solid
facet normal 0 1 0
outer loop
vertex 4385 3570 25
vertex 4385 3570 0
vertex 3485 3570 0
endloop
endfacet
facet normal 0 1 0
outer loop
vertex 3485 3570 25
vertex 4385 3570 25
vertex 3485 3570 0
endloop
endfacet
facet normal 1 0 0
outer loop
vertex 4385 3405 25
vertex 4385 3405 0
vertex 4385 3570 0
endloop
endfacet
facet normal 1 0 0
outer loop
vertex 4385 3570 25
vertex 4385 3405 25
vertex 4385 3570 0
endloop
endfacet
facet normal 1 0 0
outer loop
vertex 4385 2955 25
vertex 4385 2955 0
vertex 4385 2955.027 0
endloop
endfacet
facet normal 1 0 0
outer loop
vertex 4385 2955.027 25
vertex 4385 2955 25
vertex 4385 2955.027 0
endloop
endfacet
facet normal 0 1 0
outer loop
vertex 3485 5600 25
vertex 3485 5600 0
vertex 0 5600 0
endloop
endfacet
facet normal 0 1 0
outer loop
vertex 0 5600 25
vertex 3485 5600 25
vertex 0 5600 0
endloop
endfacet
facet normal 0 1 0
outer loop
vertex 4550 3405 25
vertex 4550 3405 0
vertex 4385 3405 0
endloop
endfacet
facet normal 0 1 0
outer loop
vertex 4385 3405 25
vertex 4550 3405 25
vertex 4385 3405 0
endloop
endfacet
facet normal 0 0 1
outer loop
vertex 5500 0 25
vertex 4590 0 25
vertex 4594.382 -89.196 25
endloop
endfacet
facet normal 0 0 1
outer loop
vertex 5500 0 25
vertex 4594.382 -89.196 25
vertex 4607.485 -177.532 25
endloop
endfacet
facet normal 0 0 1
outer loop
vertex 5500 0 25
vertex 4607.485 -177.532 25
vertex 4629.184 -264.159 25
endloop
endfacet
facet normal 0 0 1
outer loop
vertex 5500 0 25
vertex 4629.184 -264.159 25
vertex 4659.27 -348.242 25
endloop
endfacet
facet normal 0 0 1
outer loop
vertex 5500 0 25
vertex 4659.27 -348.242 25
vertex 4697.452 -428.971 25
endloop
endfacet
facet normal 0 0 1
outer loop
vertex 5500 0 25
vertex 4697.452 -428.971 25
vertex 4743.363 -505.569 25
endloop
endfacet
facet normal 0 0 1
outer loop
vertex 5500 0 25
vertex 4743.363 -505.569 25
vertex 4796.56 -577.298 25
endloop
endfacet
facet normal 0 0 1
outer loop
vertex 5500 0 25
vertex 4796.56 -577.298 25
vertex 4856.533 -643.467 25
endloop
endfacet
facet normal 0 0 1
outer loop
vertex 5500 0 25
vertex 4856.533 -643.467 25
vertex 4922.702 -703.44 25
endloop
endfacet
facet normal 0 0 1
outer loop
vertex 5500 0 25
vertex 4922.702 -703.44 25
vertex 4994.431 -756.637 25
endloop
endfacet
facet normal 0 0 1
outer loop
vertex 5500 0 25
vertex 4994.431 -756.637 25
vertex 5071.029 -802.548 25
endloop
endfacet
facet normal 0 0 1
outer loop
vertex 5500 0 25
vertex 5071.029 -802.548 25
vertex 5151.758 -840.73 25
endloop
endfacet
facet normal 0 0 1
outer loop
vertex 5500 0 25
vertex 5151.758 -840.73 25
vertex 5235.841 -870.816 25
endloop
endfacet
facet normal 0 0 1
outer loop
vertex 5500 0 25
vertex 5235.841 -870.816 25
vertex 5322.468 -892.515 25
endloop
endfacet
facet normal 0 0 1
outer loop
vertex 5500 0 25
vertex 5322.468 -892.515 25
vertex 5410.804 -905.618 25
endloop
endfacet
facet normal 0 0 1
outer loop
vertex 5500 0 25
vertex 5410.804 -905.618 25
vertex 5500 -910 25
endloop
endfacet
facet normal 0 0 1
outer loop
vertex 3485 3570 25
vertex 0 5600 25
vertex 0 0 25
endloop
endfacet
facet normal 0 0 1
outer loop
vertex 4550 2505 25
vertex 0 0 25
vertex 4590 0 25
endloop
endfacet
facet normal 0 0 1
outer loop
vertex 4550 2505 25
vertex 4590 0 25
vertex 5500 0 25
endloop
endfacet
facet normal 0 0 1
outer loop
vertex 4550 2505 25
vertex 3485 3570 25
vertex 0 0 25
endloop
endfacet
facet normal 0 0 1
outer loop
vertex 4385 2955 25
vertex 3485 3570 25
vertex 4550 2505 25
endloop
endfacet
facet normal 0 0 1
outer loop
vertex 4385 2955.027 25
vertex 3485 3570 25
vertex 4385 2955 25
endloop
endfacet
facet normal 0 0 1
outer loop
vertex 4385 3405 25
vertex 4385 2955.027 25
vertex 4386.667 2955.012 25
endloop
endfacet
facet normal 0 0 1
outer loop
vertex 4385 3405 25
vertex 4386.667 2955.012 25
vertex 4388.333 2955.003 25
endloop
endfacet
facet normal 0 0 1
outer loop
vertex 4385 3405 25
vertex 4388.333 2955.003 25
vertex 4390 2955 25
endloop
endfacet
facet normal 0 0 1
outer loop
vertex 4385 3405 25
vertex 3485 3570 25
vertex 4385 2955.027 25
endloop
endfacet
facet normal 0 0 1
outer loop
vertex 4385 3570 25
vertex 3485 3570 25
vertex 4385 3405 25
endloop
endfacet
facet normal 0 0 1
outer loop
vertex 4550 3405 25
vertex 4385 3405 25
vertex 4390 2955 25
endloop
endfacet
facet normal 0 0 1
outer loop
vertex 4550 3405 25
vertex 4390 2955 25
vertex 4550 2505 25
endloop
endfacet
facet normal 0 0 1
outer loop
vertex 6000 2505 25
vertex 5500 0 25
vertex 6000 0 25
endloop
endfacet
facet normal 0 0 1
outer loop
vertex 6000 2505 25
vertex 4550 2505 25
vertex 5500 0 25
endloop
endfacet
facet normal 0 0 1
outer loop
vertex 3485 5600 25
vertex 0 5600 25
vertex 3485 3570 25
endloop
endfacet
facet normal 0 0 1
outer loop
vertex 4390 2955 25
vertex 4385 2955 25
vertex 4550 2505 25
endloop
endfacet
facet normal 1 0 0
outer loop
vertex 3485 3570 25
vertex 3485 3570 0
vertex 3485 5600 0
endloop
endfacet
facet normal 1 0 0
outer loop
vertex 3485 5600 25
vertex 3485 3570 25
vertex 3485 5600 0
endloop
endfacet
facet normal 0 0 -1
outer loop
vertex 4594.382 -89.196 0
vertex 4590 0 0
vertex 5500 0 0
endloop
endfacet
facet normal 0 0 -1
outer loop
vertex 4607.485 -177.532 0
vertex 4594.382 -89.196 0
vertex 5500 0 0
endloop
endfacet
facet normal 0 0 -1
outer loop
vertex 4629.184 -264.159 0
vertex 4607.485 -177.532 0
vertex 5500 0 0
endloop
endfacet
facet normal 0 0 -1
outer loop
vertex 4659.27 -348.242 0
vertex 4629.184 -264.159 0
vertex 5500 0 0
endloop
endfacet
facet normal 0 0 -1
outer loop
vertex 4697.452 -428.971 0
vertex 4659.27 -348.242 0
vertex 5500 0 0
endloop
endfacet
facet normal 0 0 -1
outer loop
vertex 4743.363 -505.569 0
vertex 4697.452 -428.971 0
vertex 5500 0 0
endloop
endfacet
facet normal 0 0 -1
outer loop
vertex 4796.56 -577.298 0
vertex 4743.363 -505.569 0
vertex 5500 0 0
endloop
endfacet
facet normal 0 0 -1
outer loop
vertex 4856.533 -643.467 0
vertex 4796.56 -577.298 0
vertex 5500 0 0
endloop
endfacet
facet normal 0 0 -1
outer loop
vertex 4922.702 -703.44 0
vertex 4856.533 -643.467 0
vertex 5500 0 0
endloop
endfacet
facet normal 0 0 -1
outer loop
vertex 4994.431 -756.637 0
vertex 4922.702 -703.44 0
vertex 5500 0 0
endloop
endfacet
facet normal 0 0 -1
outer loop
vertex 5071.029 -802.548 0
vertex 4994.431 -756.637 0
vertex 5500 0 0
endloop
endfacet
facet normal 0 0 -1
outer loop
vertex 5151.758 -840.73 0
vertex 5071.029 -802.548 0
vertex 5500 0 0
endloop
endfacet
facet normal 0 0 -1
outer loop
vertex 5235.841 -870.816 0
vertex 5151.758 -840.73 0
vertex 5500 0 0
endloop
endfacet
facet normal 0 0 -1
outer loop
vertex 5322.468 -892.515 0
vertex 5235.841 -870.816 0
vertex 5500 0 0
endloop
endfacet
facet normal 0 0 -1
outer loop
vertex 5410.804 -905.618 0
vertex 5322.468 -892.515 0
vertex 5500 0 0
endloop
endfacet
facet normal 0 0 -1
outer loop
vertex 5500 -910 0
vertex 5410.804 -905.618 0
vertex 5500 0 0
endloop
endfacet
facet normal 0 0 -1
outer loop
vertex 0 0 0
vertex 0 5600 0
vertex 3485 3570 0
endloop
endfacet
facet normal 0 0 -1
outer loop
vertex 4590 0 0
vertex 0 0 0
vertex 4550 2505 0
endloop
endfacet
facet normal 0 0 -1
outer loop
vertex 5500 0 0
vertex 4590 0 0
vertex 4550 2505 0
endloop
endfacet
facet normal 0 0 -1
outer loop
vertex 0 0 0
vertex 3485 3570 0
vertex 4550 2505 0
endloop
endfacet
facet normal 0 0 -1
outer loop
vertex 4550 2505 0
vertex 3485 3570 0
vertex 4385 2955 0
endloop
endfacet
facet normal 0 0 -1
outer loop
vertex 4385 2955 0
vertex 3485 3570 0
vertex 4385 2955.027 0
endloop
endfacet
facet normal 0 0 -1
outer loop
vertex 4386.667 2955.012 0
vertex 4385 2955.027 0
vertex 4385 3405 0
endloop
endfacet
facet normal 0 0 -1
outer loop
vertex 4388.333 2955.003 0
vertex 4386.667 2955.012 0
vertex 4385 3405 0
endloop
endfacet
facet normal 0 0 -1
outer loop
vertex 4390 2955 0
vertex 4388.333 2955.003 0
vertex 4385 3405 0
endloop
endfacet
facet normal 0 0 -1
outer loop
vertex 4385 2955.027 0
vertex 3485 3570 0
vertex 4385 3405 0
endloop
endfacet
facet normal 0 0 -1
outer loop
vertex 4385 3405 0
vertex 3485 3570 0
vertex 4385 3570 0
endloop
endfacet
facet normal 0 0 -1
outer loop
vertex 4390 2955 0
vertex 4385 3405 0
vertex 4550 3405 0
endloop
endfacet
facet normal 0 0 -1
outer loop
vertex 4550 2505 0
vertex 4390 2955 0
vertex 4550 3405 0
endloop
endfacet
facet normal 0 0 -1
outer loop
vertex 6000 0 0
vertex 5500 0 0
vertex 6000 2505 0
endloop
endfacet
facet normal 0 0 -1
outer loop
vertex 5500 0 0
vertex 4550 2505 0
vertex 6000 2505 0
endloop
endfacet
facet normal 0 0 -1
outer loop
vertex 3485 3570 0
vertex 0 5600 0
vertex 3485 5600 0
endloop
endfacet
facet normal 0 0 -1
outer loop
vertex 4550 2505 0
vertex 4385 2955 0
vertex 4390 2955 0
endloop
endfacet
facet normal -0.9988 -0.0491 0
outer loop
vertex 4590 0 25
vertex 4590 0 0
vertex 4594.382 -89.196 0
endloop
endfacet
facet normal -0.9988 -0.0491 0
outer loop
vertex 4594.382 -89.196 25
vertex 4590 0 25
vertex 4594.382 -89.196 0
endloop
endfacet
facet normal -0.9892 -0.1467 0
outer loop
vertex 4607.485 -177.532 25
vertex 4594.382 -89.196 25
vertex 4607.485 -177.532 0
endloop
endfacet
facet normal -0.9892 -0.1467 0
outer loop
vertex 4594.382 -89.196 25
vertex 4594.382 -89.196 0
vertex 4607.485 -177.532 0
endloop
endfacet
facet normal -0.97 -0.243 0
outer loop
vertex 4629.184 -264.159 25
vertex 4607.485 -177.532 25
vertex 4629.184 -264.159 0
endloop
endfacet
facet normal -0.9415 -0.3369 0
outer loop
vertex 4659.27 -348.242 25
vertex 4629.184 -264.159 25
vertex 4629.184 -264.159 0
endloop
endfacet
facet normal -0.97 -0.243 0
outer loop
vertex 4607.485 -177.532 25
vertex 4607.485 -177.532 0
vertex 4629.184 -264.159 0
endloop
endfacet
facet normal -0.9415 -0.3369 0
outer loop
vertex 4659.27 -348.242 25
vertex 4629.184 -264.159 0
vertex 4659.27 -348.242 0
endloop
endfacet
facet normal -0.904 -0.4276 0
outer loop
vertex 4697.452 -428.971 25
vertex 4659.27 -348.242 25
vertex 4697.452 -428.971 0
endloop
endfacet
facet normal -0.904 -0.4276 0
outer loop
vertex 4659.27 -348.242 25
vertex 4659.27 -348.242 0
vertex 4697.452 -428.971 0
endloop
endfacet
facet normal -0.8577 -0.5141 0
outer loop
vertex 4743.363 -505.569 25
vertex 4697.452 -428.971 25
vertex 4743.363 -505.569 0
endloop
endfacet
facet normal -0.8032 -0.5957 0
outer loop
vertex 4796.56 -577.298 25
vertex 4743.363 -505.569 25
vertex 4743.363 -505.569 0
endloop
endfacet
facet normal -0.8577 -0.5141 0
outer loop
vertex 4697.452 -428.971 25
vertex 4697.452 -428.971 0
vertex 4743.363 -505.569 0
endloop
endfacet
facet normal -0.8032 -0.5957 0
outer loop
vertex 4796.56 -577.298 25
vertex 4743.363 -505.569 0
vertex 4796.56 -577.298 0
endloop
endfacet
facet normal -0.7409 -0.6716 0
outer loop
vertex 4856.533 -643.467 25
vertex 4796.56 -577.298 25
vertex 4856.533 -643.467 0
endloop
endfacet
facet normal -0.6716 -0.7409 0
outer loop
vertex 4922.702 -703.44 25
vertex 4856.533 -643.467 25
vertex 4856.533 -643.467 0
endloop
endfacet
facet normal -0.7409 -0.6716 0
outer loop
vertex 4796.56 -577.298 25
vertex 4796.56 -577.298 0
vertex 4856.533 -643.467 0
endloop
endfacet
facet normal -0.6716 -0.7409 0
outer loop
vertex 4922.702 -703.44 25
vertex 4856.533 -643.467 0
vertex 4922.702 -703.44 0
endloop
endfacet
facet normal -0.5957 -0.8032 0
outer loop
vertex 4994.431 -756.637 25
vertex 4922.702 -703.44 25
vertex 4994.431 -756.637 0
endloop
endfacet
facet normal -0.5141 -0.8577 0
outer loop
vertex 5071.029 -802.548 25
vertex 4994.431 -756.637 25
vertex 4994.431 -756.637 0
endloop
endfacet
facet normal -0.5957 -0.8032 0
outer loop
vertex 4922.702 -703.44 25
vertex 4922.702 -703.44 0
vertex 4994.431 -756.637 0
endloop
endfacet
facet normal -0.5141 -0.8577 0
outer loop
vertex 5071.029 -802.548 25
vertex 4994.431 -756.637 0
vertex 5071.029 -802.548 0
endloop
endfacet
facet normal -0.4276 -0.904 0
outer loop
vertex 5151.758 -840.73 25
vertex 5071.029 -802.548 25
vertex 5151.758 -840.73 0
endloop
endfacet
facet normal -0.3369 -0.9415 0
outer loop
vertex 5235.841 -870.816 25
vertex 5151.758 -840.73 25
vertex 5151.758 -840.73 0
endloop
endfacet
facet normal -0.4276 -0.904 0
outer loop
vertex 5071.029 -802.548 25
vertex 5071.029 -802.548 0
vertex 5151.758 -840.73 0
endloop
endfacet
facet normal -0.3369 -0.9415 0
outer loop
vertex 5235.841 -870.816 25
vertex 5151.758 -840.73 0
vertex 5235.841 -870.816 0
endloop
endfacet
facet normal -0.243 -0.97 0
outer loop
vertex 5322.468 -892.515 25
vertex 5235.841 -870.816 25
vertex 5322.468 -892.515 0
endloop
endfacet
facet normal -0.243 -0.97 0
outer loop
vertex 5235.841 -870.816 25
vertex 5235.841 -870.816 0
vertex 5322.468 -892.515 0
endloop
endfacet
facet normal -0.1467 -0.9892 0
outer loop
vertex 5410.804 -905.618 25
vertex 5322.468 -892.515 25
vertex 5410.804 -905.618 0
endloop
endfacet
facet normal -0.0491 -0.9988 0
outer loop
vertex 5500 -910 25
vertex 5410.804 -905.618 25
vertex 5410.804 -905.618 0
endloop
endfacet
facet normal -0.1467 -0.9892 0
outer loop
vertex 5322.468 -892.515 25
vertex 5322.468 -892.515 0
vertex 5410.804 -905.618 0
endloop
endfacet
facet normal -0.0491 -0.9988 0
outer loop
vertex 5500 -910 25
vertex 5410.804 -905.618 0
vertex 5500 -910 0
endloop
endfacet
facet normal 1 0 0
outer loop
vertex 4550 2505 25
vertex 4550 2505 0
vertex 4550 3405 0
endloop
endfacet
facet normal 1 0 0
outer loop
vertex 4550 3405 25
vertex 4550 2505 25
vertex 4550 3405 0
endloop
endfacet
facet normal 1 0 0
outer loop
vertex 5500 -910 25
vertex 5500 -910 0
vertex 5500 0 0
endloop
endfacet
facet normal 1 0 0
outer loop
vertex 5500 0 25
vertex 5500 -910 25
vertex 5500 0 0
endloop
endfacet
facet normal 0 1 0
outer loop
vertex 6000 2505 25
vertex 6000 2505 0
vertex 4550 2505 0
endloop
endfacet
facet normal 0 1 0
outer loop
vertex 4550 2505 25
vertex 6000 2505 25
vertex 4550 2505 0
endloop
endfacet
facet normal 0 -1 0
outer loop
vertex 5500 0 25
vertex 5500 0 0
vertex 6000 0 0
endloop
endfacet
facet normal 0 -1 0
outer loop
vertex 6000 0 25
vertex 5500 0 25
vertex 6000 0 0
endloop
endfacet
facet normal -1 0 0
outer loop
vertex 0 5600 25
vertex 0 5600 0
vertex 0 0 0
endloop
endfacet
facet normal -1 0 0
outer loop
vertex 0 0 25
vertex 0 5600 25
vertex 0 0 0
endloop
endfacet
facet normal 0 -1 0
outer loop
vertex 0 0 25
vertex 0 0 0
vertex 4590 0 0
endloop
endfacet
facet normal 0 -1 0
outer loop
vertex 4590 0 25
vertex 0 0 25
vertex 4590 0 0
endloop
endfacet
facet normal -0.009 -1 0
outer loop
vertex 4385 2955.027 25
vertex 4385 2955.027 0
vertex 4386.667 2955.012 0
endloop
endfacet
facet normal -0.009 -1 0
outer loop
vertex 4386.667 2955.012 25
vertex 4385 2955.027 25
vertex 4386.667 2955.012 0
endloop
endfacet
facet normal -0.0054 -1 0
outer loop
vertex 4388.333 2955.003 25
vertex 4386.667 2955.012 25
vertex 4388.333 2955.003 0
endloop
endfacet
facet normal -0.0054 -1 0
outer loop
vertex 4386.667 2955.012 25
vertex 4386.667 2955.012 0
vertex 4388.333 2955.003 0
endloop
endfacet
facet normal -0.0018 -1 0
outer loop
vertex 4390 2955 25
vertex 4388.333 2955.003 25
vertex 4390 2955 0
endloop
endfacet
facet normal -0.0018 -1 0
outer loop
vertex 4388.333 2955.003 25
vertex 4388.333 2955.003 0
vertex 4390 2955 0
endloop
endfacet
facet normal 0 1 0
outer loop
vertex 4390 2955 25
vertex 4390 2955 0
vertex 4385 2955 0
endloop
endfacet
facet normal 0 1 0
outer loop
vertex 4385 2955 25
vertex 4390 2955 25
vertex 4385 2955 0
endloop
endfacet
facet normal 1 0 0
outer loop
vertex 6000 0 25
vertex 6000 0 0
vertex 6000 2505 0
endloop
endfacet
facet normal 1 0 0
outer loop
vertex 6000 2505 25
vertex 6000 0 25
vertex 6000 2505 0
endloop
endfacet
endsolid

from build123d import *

# Parameters (mm, degrees)
F1_DEPTH = 25


with BuildPart() as f1:
    # F0 (on Top) → F1 (new body)
    with BuildSketch(Plane.XY):
        with BuildLine():
            Line((4385, 3570), (3935, 3570))
            Line((3935, 3570), (3935, 3410))
            ThreePointArc((3935, 3410), (4066.503478, 3090.039065), (4385, 2955.027473))
            ThreePointArc((4385, 2955.027473), (4387.499962, 2955.006868), (4390, 2955))
            Line((4390, 2955), (4550, 2955))
            Line((4550, 2955), (4550, 3405))
            Line((4550, 3405), (4385, 3405))
            Line((4385, 3405), (4385, 3570))
        make_face()
        with BuildLine():
            Line((4395, 2505), (4550, 2505))
            Line((4550, 2505), (4550, 2955))
            Line((4550, 2955), (4390, 2955))
            Line((4390, 2955), (4385, 2955))
            Line((4385, 2955), (4385, 2955.027473))
            ThreePointArc((4385, 2955.027473), (4066.503478, 3090.039065), (3935, 3410))
            Line((3935, 3410), (3935, 3570))
            Line((3935, 3570), (3485, 3570))
            Line((3485, 3570), (3485, 3415))
            ThreePointArc((3485, 3415), (3748.006955, 2775.07813), (4385, 2505.054947))
            ThreePointArc((4385, 2505.054947), (4389.999925, 2505.013737), (4395, 2505))
        make_face()
        with BuildLine():
            Line((0, 5600), (0, 0))
            Line((0, 0), (4590, 0))
            ThreePointArc((4590, 0), (4856.532829, -643.467171), (5500, -910))
            Line((5500, -910), (5500, 0))
            Line((5500, 0), (6000, 0))
            Line((6000, 0), (6000, 2505))
            Line((6000, 2505), (5710, 2505))
            Line((5710, 2505), (5420, 2505))
            Line((5420, 2505), (5130, 2505))
            Line((5130, 2505), (4840, 2505))
            Line((4840, 2505), (4550, 2505))
            Line((4550, 2505), (4395, 2505))
            ThreePointArc((4395, 2505), (4389.999925, 2505.013737), (4385, 2505.054947))
            ThreePointArc((4385, 2505.054947), (3748.006955, 2775.07813), (3485, 3415))
            Line((3485, 3415), (3485, 3570))
            Line((3485, 3570), (3485, 3860))
            Line((3485, 3860), (3485, 4150))
            Line((3485, 4150), (3485, 4440))
            Line((3485, 4440), (3485, 4730))
            Line((3485, 4730), (3485, 5020))
            Line((3485, 5020), (3485, 5310))
            Line((3485, 5310), (3485, 5527.981281))
            Line((3485, 5527.981281), (3485, 5600))
            Line((3485, 5600), (0, 5600))
        make_face()
    extrude(amount=F1_DEPTH)


solid = f1.part
